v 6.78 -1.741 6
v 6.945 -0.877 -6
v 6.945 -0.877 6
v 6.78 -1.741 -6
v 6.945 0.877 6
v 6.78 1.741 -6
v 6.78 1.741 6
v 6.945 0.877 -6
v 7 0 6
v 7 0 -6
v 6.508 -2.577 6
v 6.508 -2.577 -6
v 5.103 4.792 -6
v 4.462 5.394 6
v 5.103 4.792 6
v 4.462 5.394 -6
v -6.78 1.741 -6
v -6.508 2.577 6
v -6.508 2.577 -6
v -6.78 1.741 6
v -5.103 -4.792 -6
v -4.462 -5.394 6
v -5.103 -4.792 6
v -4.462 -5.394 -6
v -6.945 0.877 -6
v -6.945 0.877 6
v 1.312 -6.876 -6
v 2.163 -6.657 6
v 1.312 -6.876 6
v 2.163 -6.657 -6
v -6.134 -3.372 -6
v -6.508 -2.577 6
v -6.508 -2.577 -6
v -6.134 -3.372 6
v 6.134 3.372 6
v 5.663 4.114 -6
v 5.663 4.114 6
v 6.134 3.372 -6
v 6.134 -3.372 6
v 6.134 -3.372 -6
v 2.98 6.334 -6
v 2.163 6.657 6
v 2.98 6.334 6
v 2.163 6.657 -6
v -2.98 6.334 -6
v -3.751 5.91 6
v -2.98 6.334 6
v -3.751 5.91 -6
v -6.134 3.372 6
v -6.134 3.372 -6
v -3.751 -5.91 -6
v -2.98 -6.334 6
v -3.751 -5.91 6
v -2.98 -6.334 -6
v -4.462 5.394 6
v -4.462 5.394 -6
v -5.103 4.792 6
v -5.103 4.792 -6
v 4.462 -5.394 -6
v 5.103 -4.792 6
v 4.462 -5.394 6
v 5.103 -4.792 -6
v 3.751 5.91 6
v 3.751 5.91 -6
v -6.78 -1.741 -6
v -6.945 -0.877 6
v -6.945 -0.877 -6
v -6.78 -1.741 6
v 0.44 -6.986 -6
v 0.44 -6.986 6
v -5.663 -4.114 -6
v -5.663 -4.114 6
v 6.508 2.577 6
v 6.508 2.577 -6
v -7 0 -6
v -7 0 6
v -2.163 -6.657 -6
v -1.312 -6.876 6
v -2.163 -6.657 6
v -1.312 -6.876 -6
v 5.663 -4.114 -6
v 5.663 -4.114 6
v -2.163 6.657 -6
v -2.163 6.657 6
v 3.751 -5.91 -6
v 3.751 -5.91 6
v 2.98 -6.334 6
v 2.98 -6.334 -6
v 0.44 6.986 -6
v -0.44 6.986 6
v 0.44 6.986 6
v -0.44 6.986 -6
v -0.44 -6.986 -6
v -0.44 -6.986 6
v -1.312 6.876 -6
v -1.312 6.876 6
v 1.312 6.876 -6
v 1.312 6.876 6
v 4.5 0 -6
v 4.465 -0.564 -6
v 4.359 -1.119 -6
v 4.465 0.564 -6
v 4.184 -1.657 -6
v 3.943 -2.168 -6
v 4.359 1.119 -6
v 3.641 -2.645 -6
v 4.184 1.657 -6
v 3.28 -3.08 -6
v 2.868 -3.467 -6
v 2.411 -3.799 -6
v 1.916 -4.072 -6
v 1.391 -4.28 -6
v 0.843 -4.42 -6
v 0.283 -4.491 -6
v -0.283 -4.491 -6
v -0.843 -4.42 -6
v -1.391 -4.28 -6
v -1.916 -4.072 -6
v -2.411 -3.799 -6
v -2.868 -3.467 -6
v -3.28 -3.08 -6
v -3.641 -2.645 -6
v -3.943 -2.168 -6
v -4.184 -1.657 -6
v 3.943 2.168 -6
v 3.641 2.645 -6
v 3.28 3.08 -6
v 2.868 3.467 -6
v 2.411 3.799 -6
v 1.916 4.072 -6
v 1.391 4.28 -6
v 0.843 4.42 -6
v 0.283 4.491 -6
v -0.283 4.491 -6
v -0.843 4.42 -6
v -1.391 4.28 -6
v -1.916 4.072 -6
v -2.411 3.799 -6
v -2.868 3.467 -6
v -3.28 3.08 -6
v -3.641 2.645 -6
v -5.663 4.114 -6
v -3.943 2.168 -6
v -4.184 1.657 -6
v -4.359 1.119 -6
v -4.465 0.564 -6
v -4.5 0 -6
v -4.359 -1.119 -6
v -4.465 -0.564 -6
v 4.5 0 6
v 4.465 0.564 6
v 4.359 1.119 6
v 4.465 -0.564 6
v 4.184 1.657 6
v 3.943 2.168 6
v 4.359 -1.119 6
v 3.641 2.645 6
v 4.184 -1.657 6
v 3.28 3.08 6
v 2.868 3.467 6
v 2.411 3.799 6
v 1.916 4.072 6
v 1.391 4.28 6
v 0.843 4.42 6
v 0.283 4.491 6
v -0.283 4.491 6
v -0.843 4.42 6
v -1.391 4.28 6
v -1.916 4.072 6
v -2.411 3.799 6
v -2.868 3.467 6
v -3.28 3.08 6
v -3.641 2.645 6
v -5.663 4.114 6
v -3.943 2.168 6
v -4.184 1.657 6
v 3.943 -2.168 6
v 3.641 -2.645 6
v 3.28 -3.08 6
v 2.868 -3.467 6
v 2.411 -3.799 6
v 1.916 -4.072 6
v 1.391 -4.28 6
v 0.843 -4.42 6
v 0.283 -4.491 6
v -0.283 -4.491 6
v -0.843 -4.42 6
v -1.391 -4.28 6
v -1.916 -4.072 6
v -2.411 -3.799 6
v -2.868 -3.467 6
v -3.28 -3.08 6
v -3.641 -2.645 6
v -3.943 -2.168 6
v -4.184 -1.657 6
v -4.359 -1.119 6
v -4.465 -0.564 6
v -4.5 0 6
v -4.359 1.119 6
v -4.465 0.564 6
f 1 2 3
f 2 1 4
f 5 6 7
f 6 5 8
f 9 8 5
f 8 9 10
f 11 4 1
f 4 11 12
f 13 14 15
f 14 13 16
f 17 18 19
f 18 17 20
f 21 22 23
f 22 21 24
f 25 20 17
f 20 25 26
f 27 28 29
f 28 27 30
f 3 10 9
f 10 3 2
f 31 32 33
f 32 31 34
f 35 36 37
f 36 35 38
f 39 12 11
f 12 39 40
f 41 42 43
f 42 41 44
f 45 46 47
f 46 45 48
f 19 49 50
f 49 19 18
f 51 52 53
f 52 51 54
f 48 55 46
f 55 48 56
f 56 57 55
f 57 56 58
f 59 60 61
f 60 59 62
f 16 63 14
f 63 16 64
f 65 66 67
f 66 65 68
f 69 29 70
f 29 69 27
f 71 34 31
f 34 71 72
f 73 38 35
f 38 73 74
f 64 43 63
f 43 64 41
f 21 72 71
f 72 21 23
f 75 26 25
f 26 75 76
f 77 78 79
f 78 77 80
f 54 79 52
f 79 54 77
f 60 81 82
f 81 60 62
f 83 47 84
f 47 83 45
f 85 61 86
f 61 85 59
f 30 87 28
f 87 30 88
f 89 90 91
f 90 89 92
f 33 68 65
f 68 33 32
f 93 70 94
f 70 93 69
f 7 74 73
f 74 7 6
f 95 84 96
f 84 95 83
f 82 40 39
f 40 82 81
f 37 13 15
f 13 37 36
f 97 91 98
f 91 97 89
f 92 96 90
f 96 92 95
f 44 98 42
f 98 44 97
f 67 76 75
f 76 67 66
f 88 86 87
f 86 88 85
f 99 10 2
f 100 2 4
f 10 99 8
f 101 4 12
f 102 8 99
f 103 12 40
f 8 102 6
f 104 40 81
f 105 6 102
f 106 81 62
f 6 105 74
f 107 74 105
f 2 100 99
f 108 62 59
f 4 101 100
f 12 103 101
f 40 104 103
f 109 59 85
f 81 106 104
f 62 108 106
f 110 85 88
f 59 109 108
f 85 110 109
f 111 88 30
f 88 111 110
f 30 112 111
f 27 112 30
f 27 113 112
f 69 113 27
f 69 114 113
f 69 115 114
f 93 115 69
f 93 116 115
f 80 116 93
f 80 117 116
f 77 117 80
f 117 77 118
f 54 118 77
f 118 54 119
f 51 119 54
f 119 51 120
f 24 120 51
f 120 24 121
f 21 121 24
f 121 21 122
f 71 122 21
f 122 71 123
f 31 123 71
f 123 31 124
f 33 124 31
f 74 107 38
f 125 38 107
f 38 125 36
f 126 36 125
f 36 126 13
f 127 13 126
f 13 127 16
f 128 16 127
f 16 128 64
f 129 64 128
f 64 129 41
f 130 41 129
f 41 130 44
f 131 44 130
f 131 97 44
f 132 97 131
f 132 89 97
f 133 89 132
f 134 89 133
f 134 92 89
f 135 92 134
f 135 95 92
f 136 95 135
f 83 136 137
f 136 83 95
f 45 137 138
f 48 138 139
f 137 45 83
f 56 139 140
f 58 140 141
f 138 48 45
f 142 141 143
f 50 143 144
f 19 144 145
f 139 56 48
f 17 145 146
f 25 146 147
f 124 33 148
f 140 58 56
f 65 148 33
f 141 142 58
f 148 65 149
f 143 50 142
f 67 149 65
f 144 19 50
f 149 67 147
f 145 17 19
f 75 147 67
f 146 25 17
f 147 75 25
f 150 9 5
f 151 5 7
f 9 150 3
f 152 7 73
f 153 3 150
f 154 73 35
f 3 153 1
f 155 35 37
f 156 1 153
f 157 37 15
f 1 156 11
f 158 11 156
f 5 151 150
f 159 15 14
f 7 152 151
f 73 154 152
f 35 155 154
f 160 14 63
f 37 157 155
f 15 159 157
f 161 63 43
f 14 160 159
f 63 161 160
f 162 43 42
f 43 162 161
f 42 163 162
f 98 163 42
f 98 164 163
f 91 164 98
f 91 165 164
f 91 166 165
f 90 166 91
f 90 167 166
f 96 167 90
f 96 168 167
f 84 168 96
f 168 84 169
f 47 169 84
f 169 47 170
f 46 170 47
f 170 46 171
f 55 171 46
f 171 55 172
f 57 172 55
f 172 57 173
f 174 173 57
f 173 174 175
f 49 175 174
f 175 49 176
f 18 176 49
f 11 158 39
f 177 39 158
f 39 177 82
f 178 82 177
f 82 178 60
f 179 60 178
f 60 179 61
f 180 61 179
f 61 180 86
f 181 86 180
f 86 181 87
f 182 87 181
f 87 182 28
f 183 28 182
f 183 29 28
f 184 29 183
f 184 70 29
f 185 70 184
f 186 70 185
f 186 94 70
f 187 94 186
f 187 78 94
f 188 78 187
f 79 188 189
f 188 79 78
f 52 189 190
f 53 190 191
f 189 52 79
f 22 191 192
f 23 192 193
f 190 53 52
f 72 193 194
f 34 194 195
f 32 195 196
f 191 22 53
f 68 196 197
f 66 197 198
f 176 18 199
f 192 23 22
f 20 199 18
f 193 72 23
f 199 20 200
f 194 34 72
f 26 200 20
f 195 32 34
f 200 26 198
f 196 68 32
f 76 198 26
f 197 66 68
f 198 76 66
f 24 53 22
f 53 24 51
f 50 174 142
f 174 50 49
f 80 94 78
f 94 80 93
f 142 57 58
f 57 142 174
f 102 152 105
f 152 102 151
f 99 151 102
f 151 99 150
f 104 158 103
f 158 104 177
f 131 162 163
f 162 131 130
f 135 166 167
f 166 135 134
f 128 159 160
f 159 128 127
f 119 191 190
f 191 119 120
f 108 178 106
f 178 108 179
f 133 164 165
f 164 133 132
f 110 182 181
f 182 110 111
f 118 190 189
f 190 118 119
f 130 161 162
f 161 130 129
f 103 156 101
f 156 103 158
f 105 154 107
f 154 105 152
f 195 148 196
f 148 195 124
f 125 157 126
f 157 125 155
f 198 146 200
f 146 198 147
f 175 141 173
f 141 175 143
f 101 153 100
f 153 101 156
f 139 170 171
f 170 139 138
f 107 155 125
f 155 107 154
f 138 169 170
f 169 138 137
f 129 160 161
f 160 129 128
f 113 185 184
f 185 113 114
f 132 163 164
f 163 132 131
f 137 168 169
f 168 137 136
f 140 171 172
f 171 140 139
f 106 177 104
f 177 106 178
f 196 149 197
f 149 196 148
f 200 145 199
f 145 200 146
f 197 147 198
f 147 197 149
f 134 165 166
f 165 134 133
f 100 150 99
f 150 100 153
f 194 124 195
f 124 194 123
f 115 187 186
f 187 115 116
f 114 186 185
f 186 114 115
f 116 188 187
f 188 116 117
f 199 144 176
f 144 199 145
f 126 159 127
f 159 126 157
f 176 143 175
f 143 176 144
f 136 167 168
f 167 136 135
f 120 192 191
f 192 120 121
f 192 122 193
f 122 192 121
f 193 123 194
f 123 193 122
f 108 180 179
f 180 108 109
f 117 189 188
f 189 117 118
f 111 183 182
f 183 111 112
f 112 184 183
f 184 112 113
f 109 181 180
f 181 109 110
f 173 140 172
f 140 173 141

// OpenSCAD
$fn = 50;


difference() {
	union() {
		translate(v = [0, 0, -6.0000000000]) {
			cylinder(h = 12, r = 7.0000000000);
		}
	}
	union() {
		translate(v = [0, 0, -100.0000000000]) {
			cylinder(h = 200, r = 4.5000000000);
		}
	}
}
